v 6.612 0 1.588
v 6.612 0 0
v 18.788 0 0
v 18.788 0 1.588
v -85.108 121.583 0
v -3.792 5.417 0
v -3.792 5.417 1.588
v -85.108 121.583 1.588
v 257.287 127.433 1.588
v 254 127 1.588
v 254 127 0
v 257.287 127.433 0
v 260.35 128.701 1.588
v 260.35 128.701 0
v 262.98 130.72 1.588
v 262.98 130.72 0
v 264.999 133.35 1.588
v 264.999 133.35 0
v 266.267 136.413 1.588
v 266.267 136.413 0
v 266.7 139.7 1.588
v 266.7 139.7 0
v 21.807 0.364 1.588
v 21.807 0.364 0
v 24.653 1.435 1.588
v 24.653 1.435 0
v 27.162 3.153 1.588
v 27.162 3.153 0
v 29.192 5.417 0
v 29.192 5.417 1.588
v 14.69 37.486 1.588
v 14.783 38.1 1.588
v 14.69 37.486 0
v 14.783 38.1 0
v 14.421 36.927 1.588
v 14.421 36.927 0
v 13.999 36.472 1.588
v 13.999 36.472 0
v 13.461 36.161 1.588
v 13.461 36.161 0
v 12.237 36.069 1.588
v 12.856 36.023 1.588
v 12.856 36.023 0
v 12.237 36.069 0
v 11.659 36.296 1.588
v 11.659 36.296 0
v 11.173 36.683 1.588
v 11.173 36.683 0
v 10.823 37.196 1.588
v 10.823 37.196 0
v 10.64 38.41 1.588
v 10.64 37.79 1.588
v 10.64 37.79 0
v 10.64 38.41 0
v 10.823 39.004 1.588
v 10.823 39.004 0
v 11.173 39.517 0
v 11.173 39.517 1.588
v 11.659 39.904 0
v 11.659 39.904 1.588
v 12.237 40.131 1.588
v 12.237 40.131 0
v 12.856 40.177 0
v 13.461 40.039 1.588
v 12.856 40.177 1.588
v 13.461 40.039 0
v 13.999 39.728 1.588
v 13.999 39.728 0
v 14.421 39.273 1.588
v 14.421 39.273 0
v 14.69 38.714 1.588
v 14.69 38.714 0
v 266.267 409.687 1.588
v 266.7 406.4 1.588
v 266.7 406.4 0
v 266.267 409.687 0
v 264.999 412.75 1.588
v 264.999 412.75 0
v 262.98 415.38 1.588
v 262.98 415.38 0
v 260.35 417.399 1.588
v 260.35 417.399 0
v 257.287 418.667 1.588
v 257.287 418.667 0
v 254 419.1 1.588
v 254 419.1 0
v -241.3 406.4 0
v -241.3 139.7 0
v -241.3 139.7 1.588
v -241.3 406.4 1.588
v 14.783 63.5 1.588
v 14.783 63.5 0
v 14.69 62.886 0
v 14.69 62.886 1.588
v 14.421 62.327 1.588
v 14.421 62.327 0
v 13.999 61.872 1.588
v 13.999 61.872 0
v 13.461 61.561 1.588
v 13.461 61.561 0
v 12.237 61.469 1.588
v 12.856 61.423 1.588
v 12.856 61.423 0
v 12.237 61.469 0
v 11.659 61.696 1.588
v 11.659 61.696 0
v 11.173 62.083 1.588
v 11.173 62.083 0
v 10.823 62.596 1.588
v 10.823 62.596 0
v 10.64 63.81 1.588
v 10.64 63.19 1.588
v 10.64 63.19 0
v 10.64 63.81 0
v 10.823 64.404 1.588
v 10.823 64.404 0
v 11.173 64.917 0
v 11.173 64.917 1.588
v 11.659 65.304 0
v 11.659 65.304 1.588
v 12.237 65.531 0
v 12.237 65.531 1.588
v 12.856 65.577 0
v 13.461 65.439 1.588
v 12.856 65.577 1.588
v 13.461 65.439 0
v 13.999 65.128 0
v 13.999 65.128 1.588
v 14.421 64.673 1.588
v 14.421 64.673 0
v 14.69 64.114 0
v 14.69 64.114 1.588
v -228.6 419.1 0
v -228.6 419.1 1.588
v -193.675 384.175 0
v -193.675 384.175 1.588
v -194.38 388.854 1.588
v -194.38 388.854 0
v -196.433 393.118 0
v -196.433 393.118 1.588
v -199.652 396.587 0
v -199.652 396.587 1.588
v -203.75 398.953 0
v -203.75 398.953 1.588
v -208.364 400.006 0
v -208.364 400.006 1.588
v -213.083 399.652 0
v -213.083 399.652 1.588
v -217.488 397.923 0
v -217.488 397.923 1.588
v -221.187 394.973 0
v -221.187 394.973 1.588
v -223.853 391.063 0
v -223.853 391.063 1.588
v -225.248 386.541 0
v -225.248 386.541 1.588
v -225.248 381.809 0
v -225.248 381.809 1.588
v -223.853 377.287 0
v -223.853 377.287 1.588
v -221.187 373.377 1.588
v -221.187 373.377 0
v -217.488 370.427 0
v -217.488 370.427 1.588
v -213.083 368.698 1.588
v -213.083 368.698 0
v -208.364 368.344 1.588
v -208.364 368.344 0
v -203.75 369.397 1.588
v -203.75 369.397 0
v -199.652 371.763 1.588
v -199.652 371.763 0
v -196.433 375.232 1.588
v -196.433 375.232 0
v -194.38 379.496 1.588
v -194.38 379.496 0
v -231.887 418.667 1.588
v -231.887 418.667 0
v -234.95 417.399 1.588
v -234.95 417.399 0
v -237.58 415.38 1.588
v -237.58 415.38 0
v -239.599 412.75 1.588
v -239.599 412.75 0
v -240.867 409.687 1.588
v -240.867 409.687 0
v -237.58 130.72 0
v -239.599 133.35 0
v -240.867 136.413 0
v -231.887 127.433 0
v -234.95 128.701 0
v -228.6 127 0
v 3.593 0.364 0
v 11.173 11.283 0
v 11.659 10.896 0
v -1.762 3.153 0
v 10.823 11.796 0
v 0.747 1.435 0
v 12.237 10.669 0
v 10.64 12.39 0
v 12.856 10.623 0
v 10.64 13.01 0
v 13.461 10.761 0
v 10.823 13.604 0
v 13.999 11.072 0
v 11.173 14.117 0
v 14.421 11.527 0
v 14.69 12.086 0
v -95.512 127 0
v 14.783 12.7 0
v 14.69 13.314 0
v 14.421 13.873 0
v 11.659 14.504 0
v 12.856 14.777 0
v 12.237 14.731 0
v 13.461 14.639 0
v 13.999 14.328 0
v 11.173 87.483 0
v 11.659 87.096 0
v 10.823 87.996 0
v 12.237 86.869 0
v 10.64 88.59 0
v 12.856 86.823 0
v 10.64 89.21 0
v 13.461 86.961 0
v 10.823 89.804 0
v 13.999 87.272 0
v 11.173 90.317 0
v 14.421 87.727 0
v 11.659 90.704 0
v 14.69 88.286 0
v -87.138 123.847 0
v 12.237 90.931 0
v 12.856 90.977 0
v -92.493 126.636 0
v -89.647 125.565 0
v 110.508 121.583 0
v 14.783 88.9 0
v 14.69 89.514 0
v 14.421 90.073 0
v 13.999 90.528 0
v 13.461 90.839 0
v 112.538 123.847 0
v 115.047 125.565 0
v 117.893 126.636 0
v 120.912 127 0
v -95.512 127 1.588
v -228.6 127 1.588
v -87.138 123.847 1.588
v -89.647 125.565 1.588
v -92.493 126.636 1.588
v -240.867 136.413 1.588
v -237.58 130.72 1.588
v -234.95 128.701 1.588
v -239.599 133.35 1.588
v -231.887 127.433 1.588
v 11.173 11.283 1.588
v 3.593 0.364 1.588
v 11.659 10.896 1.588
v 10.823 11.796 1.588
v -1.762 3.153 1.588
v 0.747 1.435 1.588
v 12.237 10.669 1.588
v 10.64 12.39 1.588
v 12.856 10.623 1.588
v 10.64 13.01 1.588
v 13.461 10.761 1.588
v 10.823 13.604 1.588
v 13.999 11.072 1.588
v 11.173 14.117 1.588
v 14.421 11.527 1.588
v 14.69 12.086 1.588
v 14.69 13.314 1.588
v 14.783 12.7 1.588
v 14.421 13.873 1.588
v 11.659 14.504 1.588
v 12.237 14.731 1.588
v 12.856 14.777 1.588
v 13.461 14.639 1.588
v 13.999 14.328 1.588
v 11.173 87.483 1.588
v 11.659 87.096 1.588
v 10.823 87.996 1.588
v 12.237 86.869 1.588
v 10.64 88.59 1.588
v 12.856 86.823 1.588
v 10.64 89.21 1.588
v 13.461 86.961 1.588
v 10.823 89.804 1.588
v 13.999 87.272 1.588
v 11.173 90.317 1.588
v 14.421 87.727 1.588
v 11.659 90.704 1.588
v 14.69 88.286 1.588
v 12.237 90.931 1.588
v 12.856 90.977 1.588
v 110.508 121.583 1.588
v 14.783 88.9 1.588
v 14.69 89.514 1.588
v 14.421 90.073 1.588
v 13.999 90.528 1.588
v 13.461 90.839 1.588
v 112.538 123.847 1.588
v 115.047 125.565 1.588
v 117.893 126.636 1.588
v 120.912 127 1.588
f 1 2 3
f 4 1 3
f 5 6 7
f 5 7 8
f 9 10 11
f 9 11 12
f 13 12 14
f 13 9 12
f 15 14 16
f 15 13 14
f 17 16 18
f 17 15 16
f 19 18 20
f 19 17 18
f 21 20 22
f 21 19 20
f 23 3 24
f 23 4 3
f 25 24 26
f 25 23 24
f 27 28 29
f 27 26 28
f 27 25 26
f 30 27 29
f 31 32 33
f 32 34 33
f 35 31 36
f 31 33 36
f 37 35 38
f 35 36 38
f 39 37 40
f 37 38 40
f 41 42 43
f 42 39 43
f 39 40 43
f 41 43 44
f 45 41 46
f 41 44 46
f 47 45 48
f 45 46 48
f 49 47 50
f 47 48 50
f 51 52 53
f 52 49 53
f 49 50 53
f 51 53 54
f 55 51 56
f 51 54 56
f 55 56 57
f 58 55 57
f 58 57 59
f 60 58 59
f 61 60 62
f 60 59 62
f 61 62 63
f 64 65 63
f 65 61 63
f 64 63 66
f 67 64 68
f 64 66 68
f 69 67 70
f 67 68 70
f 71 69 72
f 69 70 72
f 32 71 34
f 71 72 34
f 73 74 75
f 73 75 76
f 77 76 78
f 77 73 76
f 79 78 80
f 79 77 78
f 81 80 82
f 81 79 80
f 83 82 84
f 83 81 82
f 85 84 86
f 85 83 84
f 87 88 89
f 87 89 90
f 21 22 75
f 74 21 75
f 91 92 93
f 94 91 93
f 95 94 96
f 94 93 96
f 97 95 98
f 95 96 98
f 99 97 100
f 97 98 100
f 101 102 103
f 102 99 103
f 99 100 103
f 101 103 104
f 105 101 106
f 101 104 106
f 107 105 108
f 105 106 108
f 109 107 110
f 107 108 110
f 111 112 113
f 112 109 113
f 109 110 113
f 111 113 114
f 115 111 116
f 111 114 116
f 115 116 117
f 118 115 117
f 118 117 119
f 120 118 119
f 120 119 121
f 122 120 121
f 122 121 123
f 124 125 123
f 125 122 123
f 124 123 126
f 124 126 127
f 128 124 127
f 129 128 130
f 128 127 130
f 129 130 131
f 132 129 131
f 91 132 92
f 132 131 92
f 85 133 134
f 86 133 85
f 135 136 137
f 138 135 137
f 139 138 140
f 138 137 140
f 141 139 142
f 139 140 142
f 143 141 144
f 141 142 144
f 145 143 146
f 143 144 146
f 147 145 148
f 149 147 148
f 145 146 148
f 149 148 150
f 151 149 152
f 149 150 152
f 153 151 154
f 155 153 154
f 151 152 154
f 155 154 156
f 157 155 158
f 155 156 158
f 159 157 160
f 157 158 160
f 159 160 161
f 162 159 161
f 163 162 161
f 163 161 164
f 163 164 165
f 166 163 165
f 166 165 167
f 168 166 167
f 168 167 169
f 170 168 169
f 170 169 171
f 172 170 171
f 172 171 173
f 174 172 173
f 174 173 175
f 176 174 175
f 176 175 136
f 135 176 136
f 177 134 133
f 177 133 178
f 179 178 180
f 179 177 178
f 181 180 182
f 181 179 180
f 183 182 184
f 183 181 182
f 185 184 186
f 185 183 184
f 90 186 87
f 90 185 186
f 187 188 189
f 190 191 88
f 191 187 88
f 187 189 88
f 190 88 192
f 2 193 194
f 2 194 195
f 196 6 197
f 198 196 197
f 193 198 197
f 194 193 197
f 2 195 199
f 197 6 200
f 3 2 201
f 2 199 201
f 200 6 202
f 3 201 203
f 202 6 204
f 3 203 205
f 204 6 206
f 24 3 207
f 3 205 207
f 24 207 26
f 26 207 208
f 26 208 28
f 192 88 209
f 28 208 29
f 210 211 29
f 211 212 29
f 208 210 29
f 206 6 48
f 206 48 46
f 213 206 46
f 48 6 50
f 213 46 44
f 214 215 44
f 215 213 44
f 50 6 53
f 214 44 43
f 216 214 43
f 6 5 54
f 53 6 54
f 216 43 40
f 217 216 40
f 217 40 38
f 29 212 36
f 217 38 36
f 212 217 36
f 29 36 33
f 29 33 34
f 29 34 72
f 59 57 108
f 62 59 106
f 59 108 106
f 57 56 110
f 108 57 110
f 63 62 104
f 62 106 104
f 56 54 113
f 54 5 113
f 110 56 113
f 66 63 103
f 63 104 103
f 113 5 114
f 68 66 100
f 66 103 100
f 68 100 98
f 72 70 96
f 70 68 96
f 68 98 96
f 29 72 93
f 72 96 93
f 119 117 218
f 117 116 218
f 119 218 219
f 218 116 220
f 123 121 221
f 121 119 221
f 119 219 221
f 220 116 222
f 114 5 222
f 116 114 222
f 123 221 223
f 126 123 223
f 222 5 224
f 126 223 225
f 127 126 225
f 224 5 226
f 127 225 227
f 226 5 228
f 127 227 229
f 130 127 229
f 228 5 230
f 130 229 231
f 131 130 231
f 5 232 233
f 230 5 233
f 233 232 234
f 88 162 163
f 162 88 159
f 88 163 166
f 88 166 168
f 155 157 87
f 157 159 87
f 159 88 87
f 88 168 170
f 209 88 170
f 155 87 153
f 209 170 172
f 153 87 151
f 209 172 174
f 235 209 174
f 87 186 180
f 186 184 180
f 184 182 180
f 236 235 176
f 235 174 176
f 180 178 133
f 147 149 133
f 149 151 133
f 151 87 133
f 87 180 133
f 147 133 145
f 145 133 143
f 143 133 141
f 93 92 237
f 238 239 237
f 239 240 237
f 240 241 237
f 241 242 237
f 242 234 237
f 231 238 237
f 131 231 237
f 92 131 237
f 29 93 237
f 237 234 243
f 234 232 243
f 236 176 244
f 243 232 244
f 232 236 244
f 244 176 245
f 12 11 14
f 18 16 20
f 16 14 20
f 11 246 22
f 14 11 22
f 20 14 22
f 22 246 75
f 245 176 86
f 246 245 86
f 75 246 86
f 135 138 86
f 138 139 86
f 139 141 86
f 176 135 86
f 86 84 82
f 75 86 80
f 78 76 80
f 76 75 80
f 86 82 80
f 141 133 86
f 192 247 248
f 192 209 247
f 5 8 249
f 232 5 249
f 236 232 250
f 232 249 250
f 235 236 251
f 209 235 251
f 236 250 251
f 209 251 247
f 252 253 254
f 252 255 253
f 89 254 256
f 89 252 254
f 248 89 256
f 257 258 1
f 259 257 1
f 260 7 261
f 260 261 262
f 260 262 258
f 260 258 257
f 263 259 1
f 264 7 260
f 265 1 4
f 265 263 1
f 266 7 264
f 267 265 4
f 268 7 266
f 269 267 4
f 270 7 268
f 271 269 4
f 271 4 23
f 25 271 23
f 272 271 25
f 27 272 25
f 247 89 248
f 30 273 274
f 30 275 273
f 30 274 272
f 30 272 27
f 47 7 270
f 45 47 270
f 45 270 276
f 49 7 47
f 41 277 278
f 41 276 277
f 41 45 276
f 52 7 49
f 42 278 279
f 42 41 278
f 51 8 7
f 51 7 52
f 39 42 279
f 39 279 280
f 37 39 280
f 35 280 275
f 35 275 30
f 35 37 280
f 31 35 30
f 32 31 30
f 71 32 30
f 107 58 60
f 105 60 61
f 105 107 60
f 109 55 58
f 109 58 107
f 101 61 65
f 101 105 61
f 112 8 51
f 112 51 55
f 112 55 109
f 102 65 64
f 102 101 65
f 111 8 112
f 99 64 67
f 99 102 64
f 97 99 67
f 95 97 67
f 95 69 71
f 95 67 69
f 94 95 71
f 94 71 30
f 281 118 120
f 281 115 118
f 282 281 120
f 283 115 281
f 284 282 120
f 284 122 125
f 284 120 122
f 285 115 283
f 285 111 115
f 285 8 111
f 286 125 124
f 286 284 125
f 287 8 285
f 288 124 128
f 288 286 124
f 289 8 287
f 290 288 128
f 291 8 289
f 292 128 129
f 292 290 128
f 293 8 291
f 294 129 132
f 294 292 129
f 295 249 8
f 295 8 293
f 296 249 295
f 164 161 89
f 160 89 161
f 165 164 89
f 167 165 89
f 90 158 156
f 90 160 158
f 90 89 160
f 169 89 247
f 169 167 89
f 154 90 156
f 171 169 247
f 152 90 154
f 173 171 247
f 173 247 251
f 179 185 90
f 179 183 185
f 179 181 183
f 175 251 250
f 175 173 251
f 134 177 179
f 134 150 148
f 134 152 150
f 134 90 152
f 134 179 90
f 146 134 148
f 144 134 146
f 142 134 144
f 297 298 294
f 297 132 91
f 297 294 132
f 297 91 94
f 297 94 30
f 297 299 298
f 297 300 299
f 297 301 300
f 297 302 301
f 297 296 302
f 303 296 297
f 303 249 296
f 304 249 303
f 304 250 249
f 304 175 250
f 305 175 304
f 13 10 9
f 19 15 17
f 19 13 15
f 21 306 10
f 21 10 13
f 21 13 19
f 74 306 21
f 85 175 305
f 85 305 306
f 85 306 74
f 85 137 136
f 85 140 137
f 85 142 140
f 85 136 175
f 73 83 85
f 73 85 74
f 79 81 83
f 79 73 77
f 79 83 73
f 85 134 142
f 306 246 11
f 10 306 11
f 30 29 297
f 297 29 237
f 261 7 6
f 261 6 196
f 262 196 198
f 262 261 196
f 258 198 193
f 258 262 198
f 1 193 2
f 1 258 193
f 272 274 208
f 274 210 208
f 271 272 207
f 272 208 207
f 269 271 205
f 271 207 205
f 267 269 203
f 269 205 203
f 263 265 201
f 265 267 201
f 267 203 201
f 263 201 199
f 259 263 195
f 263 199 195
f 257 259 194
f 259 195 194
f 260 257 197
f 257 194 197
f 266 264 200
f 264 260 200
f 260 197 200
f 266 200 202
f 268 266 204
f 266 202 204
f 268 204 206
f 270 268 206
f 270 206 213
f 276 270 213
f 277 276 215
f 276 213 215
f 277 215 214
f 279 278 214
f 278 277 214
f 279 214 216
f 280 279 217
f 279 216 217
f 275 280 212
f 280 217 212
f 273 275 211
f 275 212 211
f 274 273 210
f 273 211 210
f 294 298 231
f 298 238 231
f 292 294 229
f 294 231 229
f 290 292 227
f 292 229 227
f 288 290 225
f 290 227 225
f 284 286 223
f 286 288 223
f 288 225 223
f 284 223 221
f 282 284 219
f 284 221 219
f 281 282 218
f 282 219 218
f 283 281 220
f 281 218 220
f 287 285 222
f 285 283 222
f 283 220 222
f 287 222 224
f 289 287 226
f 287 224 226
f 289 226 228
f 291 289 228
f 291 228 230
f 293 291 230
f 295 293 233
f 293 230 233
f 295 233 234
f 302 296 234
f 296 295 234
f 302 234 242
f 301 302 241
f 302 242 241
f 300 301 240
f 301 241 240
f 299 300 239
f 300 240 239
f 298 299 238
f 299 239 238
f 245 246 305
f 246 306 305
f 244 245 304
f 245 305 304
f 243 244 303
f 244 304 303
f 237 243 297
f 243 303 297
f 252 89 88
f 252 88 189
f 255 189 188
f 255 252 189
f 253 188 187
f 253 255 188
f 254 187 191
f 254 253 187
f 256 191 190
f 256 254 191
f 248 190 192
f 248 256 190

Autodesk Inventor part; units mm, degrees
ref_plane "YZ Plane" through (0, 0, 0) normal (1, 0, 0) x (0, 1, 0)
ref_plane "XZ Plane" through (0, 0, 0) normal (0, 1, 0) x (-1, 0, 0)
ref_plane "XY Plane" through (0, 0, 0) normal (0, 0, 1) x (1, 0, 0)
sketch "Sketch1" plane through (0, 0, 0) normal (0, 0, 1) x (1, 0, 0)
  line L0 (0, 0) -> (25.4, 0)
  line L1 (25.4, 0) -> (114.3, 127)
  line L2 (12.7, 0) -> (12.7, 419.1) construction
  line L3 (114.3, 127) -> (266.7, 127)
  line L4 (266.7, 127) -> (266.7, 419.1)
  line L5 (266.7, 419.1) -> (12.7, 419.1)
  circle A0 centre (12.7, 12.7) radius 2.0828
  circle A1 centre (12.7, 38.1) radius 2.0828
  circle A2 centre (12.7, 63.5) radius 2.0828
  circle A3 centre (12.7, 88.9) radius 2.0828
  line L6 (0, 0) -> (-88.9, 127)
  line L7 (-88.9, 127) -> (-241.3, 127)
  line L8 (-241.3, 127) -> (-241.3, 419.1)
  line L9 (-241.3, 419.1) -> (12.7, 419.1)
  dimension "d0" = 25.4
  dimension "d2" = 254
  dimension "d3" = 419.1
  dimension "d4" = 127
  dimension "d5" = 152.4
  dimension "d6" = 4.1656
  dimension "d7" = 12.7
  dimension "d10" = 25.4
extrude "Extrusion1" add sketch "Sketch1" along normal blind 1.5875
fillet "Fillet1" radius 12.7 8 edges at (25.4, 0, 0.7937) (114.3, 127, 0.7937) (266.7, 127, 0.7937) (266.7, 419.1, 0.7937) (-241.3, 419.1, 0.7937) (-241.3, 127, 0.7937) (-88.9, 127, 0.7937) (0, 0, 0.7937)
sketch "Sketch2" plane through (0, 0, 1.5875) normal (0, 0, 1) x (1, 0, 0)
  line L0 (254, 419.1) -> (-228.6, 419.1) projected
  line L1 (-241.3, 406.4) -> (-241.3, 139.7) projected
  circle A0 centre (-209.55, 384.175) radius 15.875
  circle A1 centre (-165.1, 384.175) radius 15.875
  circle A2 centre (-120.65, 384.175) radius 15.875
  circle A3 centre (-76.2, 384.175) radius 15.875
  circle A4 centre (-31.75, 384.175) radius 15.875
  circle A5 centre (12.7, 384.175) radius 15.875
  circle A6 centre (57.15, 384.175) radius 15.875
  circle A7 centre (101.6, 384.175) radius 15.875
  circle A8 centre (146.05, 384.175) radius 15.875
  circle A9 centre (190.5, 384.175) radius 15.875
  circle A10 centre (234.95, 384.175) radius 15.875
  circle A11 centre (-209.55, 339.725) radius 15.875
  circle A12 centre (-165.1, 339.725) radius 15.875
  circle A13 centre (-120.65, 339.725) radius 15.875
  circle A14 centre (-76.2, 339.725) radius 15.875
  circle A15 centre (-31.75, 339.725) radius 15.875
  circle A16 centre (12.7, 339.725) radius 15.875
  circle A17 centre (57.15, 339.725) radius 15.875
  circle A18 centre (101.6, 339.725) radius 15.875
  circle A19 centre (146.05, 339.725) radius 15.875
  circle A20 centre (190.5, 339.725) radius 15.875
  circle A21 centre (234.95, 339.725) radius 15.875
  circle A22 centre (-209.55, 295.275) radius 15.875
  circle A23 centre (-165.1, 295.275) radius 15.875
  circle A24 centre (-120.65, 295.275) radius 15.875
  circle A25 centre (-76.2, 295.275) radius 15.875
  circle A26 centre (-31.75, 295.275) radius 15.875
  circle A27 centre (12.7, 295.275) radius 15.875
  circle A28 centre (57.15, 295.275) radius 15.875
  circle A29 centre (101.6, 295.275) radius 15.875
  circle A30 centre (146.05, 295.275) radius 15.875
  circle A31 centre (190.5, 295.275) radius 15.875
  circle A32 centre (234.95, 295.275) radius 15.875
  circle A33 centre (-209.55, 250.825) radius 15.875
  circle A34 centre (-165.1, 250.825) radius 15.875
  circle A35 centre (-120.65, 250.825) radius 15.875
  circle A36 centre (-76.2, 250.825) radius 15.875
  circle A37 centre (-31.75, 250.825) radius 15.875
  circle A38 centre (12.7, 250.825) radius 15.875
  circle A39 centre (57.15, 250.825) radius 15.875
  circle A40 centre (101.6, 250.825) radius 15.875
  circle A41 centre (146.05, 250.825) radius 15.875
  circle A42 centre (190.5, 250.825) radius 15.875
  circle A43 centre (234.95, 250.825) radius 15.875
  circle A44 centre (-209.55, 206.375) radius 15.875
  circle A45 centre (-165.1, 206.375) radius 15.875
  circle A46 centre (-120.65, 206.375) radius 15.875
  circle A47 centre (-76.2, 206.375) radius 15.875
  circle A48 centre (-31.75, 206.375) radius 15.875
  circle A49 centre (12.7, 206.375) radius 15.875
  circle A50 centre (57.15, 206.375) radius 15.875
  circle A51 centre (101.6, 206.375) radius 15.875
  circle A52 centre (146.05, 206.375) radius 15.875
  circle A53 centre (190.5, 206.375) radius 15.875
  circle A54 centre (234.95, 206.375) radius 15.875
  circle A55 centre (-209.55, 161.925) radius 15.875
  circle A56 centre (-165.1, 161.925) radius 15.875
  circle A57 centre (-120.65, 161.925) radius 15.875
  circle A58 centre (-76.2, 161.925) radius 15.875
  circle A59 centre (-31.75, 161.925) radius 15.875
  circle A60 centre (12.7, 161.925) radius 15.875
  circle A61 centre (57.15, 161.925) radius 15.875
  circle A62 centre (101.6, 161.925) radius 15.875
  circle A63 centre (146.05, 161.925) radius 15.875
  circle A64 centre (190.5, 161.925) radius 15.875
  circle A65 centre (234.95, 161.925) radius 15.875
  circle A66 centre (-209.55, 117.475) radius 15.875
  circle A67 centre (-165.1, 117.475) radius 15.875
  circle A68 centre (-120.65, 117.475) radius 15.875
  circle A69 centre (-76.2, 117.475) radius 15.875
  circle A70 centre (-31.75, 117.475) radius 15.875
  circle A71 centre (12.7, 117.475) radius 15.875
  circle A72 centre (57.15, 117.475) radius 15.875
  circle A73 centre (101.6, 117.475) radius 15.875
  circle A74 centre (146.05, 117.475) radius 15.875
  circle A75 centre (190.5, 117.475) radius 15.875
  circle A76 centre (234.95, 117.475) radius 15.875
  circle A77 centre (-209.55, 73.025) radius 15.875
  circle A78 centre (-165.1, 73.025) radius 15.875
  circle A79 centre (-120.65, 73.025) radius 15.875
  circle A80 centre (-76.2, 73.025) radius 15.875
  circle A81 centre (-31.75, 73.025) radius 15.875
  circle A82 centre (12.7, 73.025) radius 15.875
  circle A83 centre (57.15, 73.025) radius 15.875
  circle A84 centre (101.6, 73.025) radius 15.875
  circle A85 centre (146.05, 73.025) radius 15.875
  circle A86 centre (190.5, 73.025) radius 15.875
  circle A87 centre (234.95, 73.025) radius 15.875
  point P0 (0, 0)
  dimension "d18" = 31.75
  dimension "d19" = 34.925
  dimension "d20" = 31.75
  dimension "d23" = 44.45
  dimension "d26" = 44.45
extrude "Extrusion2" cut sketch "Sketch2" against normal blind 1.5875 contours A0
properties part number "Funnel 2" material "Polycarbonate, Clear"
